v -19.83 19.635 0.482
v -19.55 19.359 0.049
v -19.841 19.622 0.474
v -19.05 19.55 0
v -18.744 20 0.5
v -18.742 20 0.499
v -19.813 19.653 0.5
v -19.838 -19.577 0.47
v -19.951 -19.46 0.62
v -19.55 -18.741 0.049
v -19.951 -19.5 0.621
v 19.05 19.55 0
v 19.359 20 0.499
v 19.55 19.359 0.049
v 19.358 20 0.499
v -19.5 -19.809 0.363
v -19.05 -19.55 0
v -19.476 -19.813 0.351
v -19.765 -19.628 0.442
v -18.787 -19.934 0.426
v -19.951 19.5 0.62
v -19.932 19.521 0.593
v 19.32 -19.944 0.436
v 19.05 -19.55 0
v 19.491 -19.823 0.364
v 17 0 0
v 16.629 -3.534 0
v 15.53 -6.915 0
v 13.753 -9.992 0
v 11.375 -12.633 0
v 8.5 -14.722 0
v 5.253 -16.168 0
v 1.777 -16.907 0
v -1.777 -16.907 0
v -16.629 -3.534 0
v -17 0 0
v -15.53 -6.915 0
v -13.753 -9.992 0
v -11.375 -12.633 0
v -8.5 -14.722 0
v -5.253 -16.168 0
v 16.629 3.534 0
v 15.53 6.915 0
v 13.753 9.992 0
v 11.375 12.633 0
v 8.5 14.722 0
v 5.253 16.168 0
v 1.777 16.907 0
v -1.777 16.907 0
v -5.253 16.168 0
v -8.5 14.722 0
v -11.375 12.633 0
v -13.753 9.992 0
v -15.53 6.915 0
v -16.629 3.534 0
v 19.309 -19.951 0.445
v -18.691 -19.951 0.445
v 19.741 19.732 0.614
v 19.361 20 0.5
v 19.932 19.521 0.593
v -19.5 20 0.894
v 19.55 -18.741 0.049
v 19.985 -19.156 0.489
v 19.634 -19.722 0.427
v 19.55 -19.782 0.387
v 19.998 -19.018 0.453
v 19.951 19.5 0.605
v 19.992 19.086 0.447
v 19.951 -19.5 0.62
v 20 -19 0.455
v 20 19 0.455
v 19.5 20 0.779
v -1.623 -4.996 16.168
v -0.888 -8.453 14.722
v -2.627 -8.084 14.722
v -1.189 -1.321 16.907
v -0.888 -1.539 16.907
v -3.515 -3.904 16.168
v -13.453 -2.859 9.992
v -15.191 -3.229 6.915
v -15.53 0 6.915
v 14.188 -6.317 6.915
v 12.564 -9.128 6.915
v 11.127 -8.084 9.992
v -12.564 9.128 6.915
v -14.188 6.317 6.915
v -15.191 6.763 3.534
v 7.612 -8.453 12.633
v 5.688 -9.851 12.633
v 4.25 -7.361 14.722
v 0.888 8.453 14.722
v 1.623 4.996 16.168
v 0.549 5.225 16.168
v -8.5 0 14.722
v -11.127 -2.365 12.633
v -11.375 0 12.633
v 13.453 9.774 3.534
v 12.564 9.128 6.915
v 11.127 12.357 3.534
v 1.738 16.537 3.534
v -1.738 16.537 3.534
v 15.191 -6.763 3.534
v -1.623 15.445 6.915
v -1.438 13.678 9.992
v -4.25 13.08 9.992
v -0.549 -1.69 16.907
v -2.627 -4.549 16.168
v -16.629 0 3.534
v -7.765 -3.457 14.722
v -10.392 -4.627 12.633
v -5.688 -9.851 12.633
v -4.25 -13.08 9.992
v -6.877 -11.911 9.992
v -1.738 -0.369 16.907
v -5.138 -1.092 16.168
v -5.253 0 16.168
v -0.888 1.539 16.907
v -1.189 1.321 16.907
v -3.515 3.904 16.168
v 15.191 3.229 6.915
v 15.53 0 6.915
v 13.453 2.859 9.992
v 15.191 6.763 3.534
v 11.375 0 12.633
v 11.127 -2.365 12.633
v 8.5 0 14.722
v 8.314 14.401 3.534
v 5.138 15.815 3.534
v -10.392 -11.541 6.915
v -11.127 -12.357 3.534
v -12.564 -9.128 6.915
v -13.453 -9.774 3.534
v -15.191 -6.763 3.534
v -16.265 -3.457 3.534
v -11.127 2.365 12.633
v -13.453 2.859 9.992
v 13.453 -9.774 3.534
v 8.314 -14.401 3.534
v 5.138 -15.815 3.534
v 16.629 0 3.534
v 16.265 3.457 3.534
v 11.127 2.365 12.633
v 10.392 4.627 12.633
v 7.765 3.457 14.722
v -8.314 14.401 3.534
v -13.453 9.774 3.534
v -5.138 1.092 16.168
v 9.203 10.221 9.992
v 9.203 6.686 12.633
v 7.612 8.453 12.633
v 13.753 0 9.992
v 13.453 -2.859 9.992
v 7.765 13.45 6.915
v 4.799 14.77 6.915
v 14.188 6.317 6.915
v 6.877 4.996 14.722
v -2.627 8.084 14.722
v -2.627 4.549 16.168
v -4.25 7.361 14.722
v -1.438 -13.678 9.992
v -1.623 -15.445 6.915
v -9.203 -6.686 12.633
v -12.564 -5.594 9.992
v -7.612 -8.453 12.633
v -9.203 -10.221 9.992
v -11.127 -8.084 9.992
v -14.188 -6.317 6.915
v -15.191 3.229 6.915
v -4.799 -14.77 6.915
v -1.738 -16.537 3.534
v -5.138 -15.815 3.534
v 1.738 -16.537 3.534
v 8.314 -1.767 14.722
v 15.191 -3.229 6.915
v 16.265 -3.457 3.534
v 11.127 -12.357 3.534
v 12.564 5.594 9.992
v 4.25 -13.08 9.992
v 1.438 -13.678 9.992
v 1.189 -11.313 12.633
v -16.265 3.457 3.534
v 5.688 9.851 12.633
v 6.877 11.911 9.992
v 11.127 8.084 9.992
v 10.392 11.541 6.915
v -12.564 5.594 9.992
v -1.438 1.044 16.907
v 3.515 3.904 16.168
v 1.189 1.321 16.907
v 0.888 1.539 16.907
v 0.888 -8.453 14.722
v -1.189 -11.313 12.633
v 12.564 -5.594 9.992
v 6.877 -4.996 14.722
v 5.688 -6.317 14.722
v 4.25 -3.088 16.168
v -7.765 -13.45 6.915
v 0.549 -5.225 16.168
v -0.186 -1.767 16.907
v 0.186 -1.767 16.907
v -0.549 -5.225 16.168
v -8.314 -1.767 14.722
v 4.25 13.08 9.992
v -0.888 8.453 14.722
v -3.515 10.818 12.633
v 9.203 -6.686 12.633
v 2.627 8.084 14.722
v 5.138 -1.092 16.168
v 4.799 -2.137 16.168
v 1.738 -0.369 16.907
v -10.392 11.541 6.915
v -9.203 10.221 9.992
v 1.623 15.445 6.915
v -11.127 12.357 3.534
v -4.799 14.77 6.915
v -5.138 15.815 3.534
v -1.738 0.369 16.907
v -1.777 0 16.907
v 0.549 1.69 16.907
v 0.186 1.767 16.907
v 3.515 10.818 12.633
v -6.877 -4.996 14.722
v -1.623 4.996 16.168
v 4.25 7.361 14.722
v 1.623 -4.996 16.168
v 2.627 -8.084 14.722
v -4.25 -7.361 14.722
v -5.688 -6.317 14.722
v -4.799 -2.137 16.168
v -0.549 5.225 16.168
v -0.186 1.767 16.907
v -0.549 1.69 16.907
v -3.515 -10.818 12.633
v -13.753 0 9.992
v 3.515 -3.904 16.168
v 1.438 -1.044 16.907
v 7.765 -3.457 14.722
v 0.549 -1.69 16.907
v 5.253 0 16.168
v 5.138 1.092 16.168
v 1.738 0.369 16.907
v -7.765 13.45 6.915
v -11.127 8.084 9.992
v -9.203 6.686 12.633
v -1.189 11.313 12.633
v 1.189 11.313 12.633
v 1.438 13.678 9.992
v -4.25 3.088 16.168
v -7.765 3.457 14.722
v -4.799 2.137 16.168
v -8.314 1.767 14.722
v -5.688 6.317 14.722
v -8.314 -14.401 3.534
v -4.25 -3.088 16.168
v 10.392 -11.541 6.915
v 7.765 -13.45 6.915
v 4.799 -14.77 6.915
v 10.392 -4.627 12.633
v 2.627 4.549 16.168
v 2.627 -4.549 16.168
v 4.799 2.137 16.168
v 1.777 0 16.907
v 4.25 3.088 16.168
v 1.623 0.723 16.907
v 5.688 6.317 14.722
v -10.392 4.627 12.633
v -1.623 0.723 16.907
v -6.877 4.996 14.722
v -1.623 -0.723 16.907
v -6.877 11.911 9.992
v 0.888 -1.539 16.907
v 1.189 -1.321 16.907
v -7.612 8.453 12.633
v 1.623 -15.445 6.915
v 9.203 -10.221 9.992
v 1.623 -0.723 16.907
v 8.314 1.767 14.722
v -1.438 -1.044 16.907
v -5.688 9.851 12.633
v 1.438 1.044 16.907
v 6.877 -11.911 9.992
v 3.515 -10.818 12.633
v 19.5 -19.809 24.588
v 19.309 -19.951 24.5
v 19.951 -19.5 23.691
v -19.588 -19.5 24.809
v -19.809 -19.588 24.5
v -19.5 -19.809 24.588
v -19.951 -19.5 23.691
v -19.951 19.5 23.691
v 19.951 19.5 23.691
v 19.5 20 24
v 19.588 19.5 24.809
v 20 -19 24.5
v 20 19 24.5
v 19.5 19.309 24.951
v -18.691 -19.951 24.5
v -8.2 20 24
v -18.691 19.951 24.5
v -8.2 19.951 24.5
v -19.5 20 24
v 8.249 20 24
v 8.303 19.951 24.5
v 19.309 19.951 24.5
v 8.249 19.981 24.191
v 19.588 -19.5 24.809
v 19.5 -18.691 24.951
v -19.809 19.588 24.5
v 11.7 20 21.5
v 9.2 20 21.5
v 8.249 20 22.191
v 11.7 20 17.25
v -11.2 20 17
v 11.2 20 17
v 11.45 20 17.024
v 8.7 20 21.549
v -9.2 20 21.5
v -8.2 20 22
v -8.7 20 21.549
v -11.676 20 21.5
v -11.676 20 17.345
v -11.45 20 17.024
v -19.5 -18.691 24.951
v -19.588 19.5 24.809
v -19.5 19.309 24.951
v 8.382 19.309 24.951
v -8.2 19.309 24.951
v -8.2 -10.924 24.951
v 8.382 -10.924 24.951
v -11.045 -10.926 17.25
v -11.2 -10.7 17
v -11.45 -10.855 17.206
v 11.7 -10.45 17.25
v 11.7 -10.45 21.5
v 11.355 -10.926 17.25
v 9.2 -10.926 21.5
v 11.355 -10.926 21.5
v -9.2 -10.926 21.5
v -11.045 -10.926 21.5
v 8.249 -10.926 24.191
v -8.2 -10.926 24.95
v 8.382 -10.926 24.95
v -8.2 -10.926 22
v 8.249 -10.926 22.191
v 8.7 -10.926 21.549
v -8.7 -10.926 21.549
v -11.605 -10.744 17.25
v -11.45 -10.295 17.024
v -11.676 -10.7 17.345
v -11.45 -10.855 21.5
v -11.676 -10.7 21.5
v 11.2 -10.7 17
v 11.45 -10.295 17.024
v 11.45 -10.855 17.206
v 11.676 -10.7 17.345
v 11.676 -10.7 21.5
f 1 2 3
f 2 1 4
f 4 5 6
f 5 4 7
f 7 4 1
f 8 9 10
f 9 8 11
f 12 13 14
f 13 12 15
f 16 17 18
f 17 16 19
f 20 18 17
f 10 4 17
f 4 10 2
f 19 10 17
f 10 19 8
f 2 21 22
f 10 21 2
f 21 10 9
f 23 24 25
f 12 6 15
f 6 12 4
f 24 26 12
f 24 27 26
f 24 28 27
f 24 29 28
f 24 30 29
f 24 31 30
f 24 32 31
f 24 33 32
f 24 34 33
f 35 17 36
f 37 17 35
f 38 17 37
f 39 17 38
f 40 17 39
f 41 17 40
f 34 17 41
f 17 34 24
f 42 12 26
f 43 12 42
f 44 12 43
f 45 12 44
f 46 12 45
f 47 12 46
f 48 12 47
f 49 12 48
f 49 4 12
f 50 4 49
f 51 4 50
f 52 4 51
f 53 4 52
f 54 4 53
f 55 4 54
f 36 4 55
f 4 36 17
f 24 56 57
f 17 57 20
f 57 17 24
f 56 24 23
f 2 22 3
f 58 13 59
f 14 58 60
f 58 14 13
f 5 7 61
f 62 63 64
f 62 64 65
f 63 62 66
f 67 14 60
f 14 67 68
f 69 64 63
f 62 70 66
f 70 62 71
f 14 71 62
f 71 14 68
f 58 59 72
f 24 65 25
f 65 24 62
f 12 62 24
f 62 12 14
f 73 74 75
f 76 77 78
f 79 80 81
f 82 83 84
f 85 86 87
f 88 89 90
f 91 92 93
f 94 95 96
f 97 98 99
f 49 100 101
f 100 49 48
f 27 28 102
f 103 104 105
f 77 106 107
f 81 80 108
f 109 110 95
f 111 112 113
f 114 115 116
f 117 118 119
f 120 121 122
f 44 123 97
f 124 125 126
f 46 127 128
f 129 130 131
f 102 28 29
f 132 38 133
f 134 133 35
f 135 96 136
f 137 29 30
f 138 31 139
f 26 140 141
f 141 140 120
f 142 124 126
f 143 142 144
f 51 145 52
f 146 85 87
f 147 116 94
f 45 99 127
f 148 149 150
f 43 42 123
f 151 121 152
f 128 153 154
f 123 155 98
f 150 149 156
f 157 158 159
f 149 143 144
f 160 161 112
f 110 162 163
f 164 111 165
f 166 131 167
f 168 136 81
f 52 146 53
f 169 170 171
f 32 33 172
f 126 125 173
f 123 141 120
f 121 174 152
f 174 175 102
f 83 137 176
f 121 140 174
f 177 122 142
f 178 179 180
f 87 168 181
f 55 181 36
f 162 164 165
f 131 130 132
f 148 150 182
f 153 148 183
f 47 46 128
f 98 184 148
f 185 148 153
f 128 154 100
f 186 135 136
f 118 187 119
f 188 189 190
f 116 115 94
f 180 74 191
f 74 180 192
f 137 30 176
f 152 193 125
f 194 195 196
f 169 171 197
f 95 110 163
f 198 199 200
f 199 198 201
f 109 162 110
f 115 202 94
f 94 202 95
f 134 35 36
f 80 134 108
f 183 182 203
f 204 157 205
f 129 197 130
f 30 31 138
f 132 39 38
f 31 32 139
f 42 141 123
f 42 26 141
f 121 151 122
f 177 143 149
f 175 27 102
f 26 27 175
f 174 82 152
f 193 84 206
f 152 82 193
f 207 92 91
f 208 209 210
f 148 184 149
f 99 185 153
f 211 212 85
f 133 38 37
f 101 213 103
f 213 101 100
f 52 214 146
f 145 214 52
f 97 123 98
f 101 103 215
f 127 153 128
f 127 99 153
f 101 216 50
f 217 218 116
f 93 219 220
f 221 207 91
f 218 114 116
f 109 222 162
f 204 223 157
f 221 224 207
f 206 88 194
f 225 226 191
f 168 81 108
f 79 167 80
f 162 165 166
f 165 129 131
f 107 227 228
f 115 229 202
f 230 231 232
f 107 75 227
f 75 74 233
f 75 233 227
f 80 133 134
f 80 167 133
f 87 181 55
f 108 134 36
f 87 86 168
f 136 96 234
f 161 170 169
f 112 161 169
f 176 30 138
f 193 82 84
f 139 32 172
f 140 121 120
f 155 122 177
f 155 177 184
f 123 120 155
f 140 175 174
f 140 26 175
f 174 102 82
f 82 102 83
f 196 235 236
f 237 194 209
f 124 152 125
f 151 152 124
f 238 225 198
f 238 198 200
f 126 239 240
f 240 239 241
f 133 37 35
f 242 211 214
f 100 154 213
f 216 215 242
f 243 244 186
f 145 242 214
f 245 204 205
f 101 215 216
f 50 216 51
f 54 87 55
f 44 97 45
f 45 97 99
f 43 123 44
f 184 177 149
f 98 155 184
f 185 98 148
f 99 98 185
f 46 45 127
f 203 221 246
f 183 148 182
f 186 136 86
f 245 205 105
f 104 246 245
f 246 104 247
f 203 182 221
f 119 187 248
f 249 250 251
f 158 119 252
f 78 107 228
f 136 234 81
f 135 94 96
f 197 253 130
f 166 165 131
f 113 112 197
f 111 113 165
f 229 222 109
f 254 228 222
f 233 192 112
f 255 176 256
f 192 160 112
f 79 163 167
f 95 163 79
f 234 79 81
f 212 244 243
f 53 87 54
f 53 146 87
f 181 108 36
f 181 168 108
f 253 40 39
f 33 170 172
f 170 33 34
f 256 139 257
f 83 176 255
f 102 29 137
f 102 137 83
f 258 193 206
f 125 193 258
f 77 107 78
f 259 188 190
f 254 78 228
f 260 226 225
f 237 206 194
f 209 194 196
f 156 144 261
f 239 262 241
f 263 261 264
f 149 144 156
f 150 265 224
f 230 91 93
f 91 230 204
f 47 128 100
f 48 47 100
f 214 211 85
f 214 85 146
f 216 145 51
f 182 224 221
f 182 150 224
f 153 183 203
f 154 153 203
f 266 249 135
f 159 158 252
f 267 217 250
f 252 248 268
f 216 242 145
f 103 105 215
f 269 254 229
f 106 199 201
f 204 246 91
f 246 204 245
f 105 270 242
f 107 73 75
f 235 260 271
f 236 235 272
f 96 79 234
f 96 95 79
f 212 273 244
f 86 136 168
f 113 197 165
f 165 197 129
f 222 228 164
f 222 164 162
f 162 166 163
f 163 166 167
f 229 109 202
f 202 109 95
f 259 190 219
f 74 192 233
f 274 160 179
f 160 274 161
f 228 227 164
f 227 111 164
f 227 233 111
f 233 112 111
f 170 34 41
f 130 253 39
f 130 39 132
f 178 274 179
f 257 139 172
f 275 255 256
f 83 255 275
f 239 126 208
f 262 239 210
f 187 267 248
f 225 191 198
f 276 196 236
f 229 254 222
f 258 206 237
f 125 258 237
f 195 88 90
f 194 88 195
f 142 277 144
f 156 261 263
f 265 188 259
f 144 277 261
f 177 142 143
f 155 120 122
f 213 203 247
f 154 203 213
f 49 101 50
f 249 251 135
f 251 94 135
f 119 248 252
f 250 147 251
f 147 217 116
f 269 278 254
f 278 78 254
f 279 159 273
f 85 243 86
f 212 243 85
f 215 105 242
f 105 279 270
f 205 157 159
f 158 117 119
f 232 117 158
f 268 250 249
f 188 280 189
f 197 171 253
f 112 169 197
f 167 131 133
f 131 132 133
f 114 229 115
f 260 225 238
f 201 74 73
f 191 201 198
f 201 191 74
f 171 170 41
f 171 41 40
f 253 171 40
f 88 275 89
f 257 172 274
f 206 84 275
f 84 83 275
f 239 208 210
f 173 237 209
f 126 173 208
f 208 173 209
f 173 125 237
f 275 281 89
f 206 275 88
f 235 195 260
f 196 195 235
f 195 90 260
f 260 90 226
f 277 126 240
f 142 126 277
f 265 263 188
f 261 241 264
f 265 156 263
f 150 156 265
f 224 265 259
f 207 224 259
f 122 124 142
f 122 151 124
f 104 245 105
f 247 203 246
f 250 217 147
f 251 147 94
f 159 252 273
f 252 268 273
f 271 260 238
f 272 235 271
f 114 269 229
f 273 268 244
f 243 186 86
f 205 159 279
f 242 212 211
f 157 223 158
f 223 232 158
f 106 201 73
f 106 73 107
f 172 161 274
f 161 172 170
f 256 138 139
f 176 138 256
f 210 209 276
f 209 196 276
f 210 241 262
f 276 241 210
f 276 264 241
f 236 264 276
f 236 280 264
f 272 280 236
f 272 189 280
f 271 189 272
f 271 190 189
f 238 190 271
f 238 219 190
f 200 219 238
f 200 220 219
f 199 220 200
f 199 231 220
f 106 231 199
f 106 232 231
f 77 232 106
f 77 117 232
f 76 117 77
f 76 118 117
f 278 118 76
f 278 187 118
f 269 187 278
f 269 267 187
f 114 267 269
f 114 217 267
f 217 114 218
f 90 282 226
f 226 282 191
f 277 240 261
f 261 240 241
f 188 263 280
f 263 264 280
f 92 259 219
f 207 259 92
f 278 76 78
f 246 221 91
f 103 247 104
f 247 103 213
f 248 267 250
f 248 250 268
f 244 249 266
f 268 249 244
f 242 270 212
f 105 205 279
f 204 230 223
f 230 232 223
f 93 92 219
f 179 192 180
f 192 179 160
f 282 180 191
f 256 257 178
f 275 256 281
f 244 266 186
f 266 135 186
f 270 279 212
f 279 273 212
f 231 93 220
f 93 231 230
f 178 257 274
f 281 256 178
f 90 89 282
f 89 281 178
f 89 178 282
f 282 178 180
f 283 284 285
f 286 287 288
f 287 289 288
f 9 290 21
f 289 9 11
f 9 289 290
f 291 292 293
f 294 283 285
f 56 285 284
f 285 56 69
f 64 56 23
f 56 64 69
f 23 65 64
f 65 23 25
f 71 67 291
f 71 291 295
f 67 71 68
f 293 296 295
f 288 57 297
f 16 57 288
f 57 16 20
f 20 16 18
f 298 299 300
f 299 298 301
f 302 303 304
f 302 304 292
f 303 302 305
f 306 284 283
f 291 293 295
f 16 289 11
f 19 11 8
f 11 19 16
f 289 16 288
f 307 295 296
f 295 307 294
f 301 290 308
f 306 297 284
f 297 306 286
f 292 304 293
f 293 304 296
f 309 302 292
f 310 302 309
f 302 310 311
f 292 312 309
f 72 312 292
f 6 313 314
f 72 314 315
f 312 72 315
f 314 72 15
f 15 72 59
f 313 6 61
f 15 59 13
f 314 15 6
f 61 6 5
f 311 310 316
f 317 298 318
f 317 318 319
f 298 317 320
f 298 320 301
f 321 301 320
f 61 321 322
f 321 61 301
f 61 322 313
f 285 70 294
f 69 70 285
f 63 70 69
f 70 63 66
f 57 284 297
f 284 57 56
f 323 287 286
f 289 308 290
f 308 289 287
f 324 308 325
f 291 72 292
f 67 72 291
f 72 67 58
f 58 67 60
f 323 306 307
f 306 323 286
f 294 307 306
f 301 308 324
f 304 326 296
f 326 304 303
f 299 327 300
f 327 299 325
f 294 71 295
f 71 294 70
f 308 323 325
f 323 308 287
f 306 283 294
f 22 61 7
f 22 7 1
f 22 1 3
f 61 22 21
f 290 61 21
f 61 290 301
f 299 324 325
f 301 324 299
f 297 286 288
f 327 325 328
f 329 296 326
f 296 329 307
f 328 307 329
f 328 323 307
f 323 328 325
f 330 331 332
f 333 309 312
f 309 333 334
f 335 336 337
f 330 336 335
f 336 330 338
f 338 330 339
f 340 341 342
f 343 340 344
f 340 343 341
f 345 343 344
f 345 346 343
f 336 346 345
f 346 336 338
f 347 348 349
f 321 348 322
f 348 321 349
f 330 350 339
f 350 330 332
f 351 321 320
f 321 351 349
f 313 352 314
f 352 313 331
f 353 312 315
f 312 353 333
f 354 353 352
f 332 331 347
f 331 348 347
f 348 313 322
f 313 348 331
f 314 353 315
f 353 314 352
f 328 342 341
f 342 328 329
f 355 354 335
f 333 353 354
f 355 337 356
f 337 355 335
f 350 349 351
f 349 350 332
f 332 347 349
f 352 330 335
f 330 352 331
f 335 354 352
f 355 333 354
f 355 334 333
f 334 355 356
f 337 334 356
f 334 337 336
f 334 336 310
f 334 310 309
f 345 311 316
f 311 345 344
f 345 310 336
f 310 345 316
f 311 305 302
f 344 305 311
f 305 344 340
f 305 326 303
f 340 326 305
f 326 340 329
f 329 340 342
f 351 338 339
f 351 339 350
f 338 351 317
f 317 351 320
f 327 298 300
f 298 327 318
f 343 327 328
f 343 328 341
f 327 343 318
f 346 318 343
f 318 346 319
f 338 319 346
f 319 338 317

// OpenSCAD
clampwidth = 23.4;
clampthick = 4;

difference(){
	shell();
	translate([0,14.05,21.1])holes();
}

module shell(){
	intersection(){
		color("Purple") RoundCube(40,40,50,1);
		difference(){
			translate([0,0,50])intersector();
			body();
		}
	}
}

module body(){
    color("Blue") sphere(17);
}

module intersector() {
    color("Red") RoundCube(40.1,40.1,100,1);
}

module holes() {
    difference(){
        color("Green") RoundCube(23.4,50,8.2,.5);
        translate([clampwidth/2-1,0,clampthick/2+.4])color("Blue") RoundCube(5,53,4,1);
        translate([-clampwidth/2+1,0,clampthick/2+.4])color("Green") RoundCube(5,53,4,1);
    }
}

module RoundCube(cubelength,cubewidth,cubeheight,cuberound){
	hull(){
			translate([cubelength/2-cuberound,cubewidth/2-cuberound,-(cubeheight-cuberound)/2])cylinder(h=cubeheight-cuberound,r=cuberound);
			translate([cubelength/2-cuberound,-cubewidth/2+cuberound,-(cubeheight-cuberound)/2])cylinder(h=cubeheight-cuberound,r=cuberound);
			translate([-cubelength/2+cuberound,cubewidth/2-cuberound,-(cubeheight-cuberound)/2])cylinder(h=cubeheight-cuberound,r=cuberound);
			translate([-cubelength/2+cuberound,-cubewidth/2+cuberound,-(cubeheight-cuberound)/2])cylinder(h=cubeheight-cuberound,r=cuberound);
			rotate([0,90,90]){
			translate([cubeheight/2-cuberound,cubelength/2-cuberound,-(cubewidth-cuberound)/2])cylinder(h=cubewidth-cuberound,r=cuberound);
			translate([cubeheight/2-cuberound,-cubelength/2+cuberound,-(cubewidth-cuberound)/2])cylinder(h=cubewidth-cuberound,r=cuberound);
			translate([-cubeheight/2+cuberound,cubelength/2-cuberound,-(cubewidth-cuberound)/2])cylinder(h=cubewidth-cuberound,r=cuberound);
			translate([-cubeheight/2+cuberound,-cubelength/2+cuberound,-(cubewidth-cuberound)/2])cylinder(h=cubewidth-cuberound,r=cuberound);
			}
			rotate([90,0,90]){
			translate([cubewidth/2-cuberound,cubeheight/2-cuberound,-(cubelength-cuberound)/2])cylinder(h=cubelength-cuberound,r=cuberound);
			translate([cubewidth/2-cuberound,-cubeheight/2+cuberound,-(cubelength-cuberound)/2])cylinder(h=cubelength-cuberound,r=cuberound);
			translate([-cubewidth/2+cuberound,cubeheight/2-cuberound,-(cubelength-cuberound)/2])cylinder(h=cubelength-cuberound,r=cuberound);
			translate([-cubewidth/2+cuberound,-cubeheight/2+cuberound,-(cubelength-cuberound)/2])cylinder(h=cubelength-cuberound,r=cuberound);
			}
	}
}
